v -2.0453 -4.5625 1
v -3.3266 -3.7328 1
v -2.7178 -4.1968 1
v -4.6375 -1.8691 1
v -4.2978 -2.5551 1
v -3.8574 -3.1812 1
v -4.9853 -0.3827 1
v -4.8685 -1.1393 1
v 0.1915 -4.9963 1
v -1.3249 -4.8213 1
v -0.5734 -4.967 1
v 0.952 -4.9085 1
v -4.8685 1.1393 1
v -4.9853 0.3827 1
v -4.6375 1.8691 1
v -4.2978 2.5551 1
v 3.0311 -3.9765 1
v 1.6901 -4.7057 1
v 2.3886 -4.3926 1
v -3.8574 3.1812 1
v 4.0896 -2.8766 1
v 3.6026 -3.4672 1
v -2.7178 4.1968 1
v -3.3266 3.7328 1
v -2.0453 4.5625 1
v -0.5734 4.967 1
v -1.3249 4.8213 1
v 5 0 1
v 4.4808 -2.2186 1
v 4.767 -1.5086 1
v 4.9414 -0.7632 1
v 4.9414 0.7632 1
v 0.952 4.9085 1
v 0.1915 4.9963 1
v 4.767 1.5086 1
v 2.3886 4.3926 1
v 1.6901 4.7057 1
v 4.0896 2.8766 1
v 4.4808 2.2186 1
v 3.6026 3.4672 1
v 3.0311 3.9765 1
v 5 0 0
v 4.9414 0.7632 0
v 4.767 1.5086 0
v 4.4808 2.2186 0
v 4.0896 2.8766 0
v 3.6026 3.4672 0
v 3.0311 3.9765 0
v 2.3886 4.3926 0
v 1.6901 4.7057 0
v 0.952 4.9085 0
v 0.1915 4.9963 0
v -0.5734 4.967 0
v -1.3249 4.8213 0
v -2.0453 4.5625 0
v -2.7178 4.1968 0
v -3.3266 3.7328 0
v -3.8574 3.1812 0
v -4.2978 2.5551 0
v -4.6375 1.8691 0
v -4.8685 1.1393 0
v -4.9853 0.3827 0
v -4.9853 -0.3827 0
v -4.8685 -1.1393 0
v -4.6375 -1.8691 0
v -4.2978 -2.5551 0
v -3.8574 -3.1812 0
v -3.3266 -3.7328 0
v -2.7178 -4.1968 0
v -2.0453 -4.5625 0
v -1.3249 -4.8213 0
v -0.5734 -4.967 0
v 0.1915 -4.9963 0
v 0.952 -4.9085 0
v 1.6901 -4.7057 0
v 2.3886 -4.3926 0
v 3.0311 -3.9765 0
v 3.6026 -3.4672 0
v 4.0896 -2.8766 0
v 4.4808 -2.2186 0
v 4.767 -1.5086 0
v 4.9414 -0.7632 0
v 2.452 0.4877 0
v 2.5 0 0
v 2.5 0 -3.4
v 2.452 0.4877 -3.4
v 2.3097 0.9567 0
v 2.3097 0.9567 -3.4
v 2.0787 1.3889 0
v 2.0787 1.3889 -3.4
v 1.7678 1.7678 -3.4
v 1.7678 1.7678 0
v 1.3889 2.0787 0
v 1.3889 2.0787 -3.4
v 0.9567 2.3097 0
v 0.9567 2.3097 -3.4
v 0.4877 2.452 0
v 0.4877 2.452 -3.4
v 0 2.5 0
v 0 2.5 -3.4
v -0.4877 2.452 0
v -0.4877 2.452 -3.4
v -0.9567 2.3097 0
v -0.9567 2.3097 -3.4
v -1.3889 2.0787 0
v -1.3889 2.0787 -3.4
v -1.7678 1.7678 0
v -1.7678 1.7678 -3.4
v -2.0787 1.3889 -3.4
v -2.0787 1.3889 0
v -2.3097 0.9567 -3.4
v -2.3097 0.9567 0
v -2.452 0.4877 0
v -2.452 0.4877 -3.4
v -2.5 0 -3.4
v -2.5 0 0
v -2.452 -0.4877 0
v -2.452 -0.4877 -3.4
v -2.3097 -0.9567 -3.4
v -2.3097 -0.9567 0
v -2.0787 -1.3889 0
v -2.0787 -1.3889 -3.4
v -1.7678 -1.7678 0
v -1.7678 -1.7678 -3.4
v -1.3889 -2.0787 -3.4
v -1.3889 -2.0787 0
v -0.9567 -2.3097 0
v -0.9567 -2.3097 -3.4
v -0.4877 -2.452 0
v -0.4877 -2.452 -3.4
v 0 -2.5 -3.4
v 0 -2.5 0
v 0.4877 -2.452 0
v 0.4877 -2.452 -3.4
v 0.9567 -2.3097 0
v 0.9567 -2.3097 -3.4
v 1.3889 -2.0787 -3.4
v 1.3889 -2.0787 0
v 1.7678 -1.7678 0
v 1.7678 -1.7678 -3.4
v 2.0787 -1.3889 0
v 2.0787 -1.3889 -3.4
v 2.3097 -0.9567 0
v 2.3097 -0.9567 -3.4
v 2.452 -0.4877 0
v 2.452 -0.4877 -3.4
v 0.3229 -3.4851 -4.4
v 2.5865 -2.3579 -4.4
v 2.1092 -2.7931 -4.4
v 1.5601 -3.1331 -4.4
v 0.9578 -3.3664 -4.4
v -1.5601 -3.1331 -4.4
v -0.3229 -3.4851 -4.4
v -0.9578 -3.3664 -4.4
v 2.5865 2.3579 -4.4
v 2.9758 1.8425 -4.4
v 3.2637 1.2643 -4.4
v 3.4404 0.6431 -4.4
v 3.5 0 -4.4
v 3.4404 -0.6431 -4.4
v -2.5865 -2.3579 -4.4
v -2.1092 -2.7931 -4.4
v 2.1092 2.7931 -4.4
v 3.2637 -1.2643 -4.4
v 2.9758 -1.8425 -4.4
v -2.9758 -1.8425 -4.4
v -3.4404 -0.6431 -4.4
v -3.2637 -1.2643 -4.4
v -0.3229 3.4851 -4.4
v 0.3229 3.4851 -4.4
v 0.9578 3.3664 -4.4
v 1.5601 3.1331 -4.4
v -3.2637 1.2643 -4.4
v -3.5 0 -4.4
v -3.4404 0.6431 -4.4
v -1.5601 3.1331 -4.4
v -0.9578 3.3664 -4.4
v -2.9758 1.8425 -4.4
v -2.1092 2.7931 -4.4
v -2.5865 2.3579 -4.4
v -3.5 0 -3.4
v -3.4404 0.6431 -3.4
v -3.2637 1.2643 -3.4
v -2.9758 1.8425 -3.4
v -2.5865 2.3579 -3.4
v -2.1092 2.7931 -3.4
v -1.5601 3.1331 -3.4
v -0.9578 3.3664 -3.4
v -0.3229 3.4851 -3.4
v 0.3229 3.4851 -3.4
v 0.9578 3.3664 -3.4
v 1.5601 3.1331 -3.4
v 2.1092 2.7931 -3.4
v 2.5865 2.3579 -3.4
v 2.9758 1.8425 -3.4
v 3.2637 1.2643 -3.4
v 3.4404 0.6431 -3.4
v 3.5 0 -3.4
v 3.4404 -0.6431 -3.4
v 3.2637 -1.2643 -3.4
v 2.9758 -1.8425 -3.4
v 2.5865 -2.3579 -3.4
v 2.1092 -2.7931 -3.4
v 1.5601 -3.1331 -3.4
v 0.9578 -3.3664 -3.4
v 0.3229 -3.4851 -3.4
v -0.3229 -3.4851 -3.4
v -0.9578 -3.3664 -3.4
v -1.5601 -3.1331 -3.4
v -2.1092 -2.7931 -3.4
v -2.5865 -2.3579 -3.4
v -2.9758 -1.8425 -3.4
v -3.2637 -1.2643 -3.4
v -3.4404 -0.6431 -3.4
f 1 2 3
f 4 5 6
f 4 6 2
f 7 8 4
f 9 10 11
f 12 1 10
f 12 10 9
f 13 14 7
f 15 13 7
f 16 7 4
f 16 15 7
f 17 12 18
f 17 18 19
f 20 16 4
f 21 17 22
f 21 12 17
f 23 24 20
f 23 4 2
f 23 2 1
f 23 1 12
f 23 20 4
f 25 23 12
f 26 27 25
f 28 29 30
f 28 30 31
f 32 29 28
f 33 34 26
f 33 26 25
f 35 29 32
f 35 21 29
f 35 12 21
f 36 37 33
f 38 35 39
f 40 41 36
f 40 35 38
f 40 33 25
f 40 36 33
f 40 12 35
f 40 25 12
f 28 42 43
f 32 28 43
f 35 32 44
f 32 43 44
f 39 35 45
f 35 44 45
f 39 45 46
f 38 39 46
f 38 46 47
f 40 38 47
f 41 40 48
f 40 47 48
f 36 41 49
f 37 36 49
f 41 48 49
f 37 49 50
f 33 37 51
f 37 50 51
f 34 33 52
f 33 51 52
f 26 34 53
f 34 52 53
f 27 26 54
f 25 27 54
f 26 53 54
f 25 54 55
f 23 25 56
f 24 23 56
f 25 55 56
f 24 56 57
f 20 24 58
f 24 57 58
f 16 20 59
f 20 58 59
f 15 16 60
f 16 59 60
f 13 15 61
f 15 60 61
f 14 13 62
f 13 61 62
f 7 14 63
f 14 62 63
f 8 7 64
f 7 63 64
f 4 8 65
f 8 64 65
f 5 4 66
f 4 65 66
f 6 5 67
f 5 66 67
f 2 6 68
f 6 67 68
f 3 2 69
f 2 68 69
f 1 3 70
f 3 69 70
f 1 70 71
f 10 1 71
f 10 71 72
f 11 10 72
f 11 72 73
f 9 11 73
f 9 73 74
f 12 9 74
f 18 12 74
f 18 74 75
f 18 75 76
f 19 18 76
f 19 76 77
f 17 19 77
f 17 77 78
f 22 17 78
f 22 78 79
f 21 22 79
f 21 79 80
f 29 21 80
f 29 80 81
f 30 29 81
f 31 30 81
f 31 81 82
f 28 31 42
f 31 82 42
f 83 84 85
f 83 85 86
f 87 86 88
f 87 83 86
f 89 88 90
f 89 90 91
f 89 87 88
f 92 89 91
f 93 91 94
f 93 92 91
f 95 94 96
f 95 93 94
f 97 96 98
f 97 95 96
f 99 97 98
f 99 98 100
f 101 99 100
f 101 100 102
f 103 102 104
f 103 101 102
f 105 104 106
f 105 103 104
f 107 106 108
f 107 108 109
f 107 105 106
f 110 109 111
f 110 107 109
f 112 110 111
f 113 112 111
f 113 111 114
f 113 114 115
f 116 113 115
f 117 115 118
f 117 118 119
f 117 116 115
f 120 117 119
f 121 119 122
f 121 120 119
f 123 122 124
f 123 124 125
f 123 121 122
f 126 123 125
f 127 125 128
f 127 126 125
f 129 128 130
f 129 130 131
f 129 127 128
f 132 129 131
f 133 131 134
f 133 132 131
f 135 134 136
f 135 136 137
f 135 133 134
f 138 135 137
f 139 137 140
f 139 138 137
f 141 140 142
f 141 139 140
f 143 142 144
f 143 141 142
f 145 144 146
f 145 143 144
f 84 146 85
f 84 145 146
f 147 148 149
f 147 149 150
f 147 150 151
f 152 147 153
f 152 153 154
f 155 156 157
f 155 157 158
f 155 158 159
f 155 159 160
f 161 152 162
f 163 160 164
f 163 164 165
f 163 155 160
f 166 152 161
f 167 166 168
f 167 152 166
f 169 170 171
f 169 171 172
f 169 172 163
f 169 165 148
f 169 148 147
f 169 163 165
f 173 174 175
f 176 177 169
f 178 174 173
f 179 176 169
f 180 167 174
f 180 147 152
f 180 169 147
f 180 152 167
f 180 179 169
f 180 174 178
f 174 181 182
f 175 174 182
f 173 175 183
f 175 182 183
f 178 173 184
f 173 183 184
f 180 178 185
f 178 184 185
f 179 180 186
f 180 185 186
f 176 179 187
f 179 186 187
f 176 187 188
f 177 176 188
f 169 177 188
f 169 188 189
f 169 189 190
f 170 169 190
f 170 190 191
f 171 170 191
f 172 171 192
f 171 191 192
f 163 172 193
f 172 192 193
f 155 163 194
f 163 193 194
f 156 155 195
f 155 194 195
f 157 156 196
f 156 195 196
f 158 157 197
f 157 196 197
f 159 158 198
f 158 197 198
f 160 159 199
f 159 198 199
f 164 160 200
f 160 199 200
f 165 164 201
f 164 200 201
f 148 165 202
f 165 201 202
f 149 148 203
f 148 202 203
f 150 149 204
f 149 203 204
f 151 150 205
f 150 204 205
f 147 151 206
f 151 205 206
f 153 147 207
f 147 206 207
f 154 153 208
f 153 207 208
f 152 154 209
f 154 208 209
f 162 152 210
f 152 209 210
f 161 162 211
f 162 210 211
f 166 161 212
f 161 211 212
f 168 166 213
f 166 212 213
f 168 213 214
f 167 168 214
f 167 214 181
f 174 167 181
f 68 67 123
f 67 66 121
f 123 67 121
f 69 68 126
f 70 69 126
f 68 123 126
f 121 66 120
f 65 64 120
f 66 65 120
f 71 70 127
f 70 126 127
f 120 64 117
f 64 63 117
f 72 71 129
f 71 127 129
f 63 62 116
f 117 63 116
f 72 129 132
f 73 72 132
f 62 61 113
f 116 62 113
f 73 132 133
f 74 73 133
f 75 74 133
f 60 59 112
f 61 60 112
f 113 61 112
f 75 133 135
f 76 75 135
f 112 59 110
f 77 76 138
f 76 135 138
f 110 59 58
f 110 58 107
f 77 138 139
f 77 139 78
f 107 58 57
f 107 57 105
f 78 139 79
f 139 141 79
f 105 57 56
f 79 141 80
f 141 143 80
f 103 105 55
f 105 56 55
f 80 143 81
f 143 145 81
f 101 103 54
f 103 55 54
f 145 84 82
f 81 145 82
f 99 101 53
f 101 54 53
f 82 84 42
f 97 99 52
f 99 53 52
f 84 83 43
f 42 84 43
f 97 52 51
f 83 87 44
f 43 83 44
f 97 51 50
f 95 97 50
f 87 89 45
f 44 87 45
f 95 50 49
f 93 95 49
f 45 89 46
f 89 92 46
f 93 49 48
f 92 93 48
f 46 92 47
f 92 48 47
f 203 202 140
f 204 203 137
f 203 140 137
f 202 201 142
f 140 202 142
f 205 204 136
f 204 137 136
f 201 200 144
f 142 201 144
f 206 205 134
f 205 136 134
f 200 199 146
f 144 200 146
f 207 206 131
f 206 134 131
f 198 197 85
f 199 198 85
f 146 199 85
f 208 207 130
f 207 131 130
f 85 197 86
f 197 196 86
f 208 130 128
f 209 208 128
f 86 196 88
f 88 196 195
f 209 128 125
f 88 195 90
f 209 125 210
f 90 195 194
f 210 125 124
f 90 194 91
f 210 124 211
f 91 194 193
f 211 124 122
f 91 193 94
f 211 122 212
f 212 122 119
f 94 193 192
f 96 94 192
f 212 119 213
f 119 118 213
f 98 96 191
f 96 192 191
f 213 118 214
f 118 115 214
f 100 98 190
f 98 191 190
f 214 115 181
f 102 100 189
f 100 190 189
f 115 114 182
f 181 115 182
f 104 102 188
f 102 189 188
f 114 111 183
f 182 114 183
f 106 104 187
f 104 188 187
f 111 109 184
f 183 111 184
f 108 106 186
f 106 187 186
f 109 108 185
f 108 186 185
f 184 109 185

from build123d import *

# Parameters (mm, degrees)
SKIZZE1_R                       = 2.5
AUFSATZ_LINEAR_AUSTRAGEN1_DEPTH = 3.4
SKIZZE2_R                       = 3.5
AUFSATZ_LINEAR_AUSTRAGEN2_DEPTH = 1
SKIZZE3_R                       = 5
AUFSATZ_LINEAR_AUSTRAGEN3_DEPTH = 1


with BuildPart() as part:
    # Skizze1 → Aufsatz-Linear austragen1 (new body)
    with BuildSketch(Plane.XY):
        Circle(SKIZZE1_R)
    extrude(amount=-AUFSATZ_LINEAR_AUSTRAGEN1_DEPTH)

    # Skizze2 → Aufsatz-Linear austragen2 (add)
    with BuildSketch(Plane(origin=(0, 0, -3.4), x_dir=(-1, 0, 0), z_dir=(0, 0, -1))):
        Circle(SKIZZE2_R)
    extrude(amount=AUFSATZ_LINEAR_AUSTRAGEN2_DEPTH)

    # Skizze3 → Aufsatz-Linear austragen3 (add)
    with BuildSketch(Plane.XY):
        Circle(SKIZZE3_R)
    extrude(amount=AUFSATZ_LINEAR_AUSTRAGEN3_DEPTH)


solid = part.part
